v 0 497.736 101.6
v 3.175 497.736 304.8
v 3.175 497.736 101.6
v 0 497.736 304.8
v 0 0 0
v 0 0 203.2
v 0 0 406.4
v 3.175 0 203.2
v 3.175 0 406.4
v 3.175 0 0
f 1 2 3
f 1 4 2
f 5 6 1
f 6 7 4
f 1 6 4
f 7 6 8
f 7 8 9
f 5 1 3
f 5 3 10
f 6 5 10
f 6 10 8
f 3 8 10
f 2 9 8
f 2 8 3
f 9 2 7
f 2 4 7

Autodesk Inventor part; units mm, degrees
ref_plane "YZ Plane" through (0, 0, 0) normal (1, 0, 0) x (0, 1, 0)
ref_plane "XZ Plane" through (0, 0, 0) normal (0, 1, 0) x (-1, 0, 0)
ref_plane "XY Plane" through (0, 0, 0) normal (0, 0, 1) x (1, 0, 0)
sketch "Sketch1" plane through (0, 0, 0) normal (1, 0, 0) x (0, 1, 0)
  line L0 (0, 0) -> (0, 406.4)
  line L1 (0, 0) -> (0, 203.2)
  line L2 (0, 203.2) -> (457.2, 203.2) construction
  line L3 (497.7363, 304.8) -> (497.7363, 101.6)
  line L4 (497.7363, 304.8) -> (0, 406.4)
  line L5 (497.7363, 101.6) -> (0, 0)
  dimension "d0" = 406.4
  dimension "d4" = 203.2
  dimension "d5" = 203.2
  dimension "d11" = 101.6
  dimension "d12" = 101.6
  dimension "d14" = 508
  dimension "d15" = 497.7363
extrude "Extrusion1" add sketch "Sketch1" along normal blind 3.175
properties part number "Polycarb Front Pannel" material "Polycarbonate, Clear"
